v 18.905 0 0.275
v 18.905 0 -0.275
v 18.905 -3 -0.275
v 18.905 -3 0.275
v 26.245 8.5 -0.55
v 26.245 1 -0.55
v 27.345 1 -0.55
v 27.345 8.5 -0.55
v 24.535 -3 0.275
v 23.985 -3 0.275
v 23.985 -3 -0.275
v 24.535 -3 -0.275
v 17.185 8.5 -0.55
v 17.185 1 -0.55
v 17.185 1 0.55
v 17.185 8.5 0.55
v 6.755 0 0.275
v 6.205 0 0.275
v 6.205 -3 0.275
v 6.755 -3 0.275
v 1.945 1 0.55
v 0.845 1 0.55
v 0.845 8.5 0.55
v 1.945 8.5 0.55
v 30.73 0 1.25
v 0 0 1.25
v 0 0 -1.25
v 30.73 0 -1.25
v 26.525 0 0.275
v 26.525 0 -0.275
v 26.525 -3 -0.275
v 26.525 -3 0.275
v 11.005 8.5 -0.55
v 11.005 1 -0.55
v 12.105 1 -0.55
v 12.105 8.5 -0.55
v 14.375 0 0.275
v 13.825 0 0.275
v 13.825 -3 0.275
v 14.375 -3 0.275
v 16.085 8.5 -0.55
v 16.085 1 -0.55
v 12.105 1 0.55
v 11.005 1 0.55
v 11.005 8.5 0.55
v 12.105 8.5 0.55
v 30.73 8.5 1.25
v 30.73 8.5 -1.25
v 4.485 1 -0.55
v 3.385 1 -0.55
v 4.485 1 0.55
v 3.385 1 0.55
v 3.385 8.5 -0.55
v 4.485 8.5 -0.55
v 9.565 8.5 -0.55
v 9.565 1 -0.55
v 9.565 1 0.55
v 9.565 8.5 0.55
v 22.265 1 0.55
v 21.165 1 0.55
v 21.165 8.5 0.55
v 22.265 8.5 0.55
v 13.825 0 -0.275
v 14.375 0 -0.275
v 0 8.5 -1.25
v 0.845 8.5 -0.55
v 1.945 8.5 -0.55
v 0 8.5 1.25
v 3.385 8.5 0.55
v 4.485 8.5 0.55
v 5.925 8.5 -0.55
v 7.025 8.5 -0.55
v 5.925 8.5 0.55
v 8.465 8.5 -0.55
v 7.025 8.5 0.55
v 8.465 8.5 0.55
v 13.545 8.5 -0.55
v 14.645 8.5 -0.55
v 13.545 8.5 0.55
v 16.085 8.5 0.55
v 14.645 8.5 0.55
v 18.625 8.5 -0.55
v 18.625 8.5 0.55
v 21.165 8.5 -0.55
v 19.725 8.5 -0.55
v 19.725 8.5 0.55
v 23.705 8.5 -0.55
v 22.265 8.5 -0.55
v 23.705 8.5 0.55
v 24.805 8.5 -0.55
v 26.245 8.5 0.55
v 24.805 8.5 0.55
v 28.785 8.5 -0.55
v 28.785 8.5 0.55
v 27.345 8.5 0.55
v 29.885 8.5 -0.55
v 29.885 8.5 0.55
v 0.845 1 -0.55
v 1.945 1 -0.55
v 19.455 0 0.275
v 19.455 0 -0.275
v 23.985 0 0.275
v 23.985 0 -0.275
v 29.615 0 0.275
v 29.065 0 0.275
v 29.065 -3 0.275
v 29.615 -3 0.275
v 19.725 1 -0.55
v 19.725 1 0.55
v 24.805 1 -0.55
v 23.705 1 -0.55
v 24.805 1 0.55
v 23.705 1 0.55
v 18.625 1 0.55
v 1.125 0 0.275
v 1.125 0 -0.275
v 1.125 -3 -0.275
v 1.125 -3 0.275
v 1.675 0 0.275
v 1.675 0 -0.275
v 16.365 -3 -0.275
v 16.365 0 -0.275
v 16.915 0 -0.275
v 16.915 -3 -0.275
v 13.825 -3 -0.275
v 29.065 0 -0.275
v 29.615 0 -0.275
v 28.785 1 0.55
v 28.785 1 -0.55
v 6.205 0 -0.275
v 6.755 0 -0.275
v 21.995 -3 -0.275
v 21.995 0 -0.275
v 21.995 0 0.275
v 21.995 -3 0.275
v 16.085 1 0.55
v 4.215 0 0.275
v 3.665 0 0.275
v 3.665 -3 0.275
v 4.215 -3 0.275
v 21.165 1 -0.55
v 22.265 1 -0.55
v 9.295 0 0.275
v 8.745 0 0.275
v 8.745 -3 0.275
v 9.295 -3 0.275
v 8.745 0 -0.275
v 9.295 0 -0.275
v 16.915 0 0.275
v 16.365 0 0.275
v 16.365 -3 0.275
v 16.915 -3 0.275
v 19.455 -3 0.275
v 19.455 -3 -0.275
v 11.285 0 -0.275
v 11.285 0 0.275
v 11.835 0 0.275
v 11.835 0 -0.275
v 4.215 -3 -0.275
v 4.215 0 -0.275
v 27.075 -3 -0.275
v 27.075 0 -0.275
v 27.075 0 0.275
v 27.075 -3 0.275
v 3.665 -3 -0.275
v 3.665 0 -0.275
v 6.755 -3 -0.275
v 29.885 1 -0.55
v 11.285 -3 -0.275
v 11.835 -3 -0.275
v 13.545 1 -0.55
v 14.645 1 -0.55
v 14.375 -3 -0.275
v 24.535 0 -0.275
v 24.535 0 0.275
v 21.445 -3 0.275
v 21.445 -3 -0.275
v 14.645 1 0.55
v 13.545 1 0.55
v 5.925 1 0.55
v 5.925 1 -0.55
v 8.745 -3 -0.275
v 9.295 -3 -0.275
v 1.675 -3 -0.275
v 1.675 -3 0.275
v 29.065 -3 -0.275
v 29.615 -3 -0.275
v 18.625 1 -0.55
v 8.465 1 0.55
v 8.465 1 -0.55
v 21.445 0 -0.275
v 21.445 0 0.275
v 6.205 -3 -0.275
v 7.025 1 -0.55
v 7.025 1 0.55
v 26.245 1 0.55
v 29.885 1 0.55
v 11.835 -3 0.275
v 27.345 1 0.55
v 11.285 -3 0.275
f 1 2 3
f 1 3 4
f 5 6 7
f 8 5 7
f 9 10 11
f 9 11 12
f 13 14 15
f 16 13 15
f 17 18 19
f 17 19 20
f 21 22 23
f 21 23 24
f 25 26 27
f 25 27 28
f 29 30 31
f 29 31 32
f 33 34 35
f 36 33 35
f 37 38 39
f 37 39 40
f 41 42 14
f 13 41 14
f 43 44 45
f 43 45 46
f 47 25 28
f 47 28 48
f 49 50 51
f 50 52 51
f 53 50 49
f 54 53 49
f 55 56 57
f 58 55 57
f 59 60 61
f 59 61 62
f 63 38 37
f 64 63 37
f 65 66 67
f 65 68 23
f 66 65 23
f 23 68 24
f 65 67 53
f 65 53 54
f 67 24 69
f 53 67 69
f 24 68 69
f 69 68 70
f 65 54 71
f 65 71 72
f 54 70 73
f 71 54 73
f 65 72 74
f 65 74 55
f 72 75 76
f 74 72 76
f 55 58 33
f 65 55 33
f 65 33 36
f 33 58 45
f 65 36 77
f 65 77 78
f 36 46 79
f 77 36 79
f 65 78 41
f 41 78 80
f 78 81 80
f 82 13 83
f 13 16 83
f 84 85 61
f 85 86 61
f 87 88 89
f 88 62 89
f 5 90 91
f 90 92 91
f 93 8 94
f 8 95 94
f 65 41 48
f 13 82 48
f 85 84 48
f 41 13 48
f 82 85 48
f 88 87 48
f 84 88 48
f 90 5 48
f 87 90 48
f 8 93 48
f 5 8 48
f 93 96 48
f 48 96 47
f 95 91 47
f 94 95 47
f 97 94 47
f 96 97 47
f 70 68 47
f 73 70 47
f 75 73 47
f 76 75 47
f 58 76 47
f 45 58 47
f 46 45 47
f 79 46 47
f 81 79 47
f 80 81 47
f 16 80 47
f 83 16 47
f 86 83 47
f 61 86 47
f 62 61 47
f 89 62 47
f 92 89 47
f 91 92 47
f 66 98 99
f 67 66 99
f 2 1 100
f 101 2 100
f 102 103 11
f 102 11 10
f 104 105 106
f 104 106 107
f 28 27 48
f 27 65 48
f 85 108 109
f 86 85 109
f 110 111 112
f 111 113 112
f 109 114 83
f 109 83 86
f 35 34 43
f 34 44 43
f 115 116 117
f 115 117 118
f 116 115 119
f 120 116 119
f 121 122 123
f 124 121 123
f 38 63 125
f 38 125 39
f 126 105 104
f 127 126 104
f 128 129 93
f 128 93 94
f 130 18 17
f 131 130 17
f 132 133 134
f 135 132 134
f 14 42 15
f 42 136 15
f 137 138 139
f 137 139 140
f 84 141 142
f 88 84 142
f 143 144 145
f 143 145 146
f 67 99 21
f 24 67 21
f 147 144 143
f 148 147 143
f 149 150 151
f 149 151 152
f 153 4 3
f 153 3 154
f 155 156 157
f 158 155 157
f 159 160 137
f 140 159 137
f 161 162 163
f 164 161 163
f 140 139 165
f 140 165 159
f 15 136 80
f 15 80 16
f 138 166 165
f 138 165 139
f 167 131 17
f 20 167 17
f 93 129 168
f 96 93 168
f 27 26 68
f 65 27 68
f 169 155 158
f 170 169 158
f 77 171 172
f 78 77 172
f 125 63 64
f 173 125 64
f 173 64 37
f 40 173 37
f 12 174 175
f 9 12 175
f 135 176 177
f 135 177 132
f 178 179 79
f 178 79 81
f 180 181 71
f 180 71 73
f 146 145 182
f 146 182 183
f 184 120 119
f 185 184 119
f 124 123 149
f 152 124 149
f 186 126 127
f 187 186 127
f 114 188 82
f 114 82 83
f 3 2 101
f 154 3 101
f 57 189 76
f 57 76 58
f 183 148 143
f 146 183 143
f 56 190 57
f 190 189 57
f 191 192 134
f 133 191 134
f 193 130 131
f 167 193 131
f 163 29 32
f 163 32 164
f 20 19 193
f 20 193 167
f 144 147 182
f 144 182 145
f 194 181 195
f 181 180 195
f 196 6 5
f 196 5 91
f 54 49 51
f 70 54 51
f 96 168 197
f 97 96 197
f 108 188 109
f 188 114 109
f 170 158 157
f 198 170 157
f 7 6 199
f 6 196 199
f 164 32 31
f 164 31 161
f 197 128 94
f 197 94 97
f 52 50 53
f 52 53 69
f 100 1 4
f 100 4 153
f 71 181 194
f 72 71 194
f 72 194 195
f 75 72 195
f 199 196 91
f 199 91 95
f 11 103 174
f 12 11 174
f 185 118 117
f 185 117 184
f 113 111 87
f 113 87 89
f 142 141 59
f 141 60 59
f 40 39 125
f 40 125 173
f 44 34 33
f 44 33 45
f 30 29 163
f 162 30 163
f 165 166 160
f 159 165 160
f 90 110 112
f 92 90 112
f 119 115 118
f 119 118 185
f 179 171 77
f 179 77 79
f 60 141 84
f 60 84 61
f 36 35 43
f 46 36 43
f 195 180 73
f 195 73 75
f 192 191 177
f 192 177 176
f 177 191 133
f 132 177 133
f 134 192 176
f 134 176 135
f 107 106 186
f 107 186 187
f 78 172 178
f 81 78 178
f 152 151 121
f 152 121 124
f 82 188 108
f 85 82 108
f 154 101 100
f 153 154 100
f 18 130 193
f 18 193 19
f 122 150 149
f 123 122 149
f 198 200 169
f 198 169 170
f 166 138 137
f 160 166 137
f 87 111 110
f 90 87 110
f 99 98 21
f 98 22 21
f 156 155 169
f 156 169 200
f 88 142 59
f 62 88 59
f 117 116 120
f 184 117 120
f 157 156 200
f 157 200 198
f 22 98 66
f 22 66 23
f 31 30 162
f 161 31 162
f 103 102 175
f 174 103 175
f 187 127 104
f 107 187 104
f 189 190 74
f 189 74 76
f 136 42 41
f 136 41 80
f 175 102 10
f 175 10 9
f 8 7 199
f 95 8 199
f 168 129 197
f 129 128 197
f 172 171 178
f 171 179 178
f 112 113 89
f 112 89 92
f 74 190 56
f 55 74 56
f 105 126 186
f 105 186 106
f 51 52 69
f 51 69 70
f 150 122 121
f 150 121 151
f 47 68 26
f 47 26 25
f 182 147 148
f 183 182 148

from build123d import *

# Parameters (mm, degrees)
SKETCH1_W              = 30.73
SKETCH1_H              = 8.5
BOSS_EXTRUDE1_DEPTH    = 1.25
SKETCH2_W              = 1.1
SKETCH2_H              = 1.1
CUT_EXTRUDE1_DEPTH     = 9.5
SKETCH3_W              = 30.73
SKETCH3_H              = 2.5
BOSS_EXTRUDE2_DEPTH    = 1
SKETCH4_W              = 0.55
SKETCH4_H              = 0.55
BOSS_EXTRUDE3_DEPTH    = 3
BOSS_EXTRUDE3_2_DEPTH  = 3
BOSS_EXTRUDE3_3_DEPTH  = 3
BOSS_EXTRUDE3_4_DEPTH  = 3
BOSS_EXTRUDE3_5_DEPTH  = 3
BOSS_EXTRUDE3_6_DEPTH  = 3
BOSS_EXTRUDE3_7_DEPTH  = 3
BOSS_EXTRUDE3_8_DEPTH  = 3
BOSS_EXTRUDE3_9_DEPTH  = 3
BOSS_EXTRUDE3_10_DEPTH = 3
BOSS_EXTRUDE3_11_DEPTH = 3
BOSS_EXTRUDE3_12_DEPTH = 3


with BuildPart() as part:
    # Sketch1 → Boss-Extrude1 (new body, symmetric)
    with BuildSketch(Plane.XY):
        with Locations((15.365, 4.25)):
            Rectangle(SKETCH1_W, SKETCH1_H)
    extrude(amount=BOSS_EXTRUDE1_DEPTH, both=True)

    # Sketch2 → Cut-Extrude1 (cut, through all)
    with BuildSketch(Plane.XZ):
        with Locations((3.935, 0)):
            Rectangle(SKETCH2_W, SKETCH2_H)
        with Locations((1.395, 0)):
            Rectangle(SKETCH2_W, SKETCH2_H)
        with Locations((6.475, 0)):
            Rectangle(SKETCH2_W, SKETCH2_H)
        with Locations((9.015, 0)):
            Rectangle(SKETCH2_W, SKETCH2_H)
        with Locations((11.555, 0)):
            Rectangle(SKETCH2_W, SKETCH2_H)
        with Locations((14.095, 0)):
            Rectangle(SKETCH2_W, SKETCH2_H)
        with Locations((16.635, 0)):
            Rectangle(SKETCH2_W, SKETCH2_H)
        with Locations((19.175, 0)):
            Rectangle(SKETCH2_W, SKETCH2_H)
        with Locations((21.715, 0)):
            Rectangle(SKETCH2_W, SKETCH2_H)
        with Locations((24.255, 0)):
            Rectangle(SKETCH2_W, SKETCH2_H)
        with Locations((26.795, 0)):
            Rectangle(SKETCH2_W, SKETCH2_H)
        with Locations((29.335, 0)):
            Rectangle(SKETCH2_W, SKETCH2_H)
    extrude(amount=-CUT_EXTRUDE1_DEPTH, mode=Mode.SUBTRACT)

    # Sketch3 → Boss-Extrude2 (add)
    with BuildSketch(Plane.XZ):
        with Locations((15.365, 0)):
            Rectangle(SKETCH3_W, SKETCH3_H)
    extrude(amount=-BOSS_EXTRUDE2_DEPTH)


with BuildPart() as body_2:
    # Sketch4 → Boss-Extrude3 (new body)
    with BuildSketch(Plane.XZ):
        with Locations((1.4, 0)):
            Rectangle(SKETCH4_W, SKETCH4_H)
    extrude(amount=BOSS_EXTRUDE3_DEPTH)


with BuildPart() as body_3:
    # Sketch4 → Boss-Extrude3 2 (new body)
    with BuildSketch(Plane.XZ):
        with Locations((3.94, 0)):
            Rectangle(SKETCH4_W, SKETCH4_H)
    extrude(amount=BOSS_EXTRUDE3_2_DEPTH)


with BuildPart() as body_4:
    # Sketch4 → Boss-Extrude3 3 (new body)
    with BuildSketch(Plane.XZ):
        with Locations((6.48, 0)):
            Rectangle(SKETCH4_W, SKETCH4_H)
    extrude(amount=BOSS_EXTRUDE3_3_DEPTH)


with BuildPart() as body_5:
    # Sketch4 → Boss-Extrude3 4 (new body)
    with BuildSketch(Plane.XZ):
        with Locations((9.02, 0)):
            Rectangle(SKETCH4_W, SKETCH4_H)
    extrude(amount=BOSS_EXTRUDE3_4_DEPTH)


with BuildPart() as body_6:
    # Sketch4 → Boss-Extrude3 5 (new body)
    with BuildSketch(Plane.XZ):
        with Locations((11.56, 0)):
            Rectangle(SKETCH4_W, SKETCH4_H)
    extrude(amount=BOSS_EXTRUDE3_5_DEPTH)


with BuildPart() as body_7:
    # Sketch4 → Boss-Extrude3 6 (new body)
    with BuildSketch(Plane.XZ):
        with Locations((14.1, 0)):
            Rectangle(SKETCH4_W, SKETCH4_H)
    extrude(amount=BOSS_EXTRUDE3_6_DEPTH)


with BuildPart() as body_8:
    # Sketch4 → Boss-Extrude3 7 (new body)
    with BuildSketch(Plane.XZ):
        with Locations((16.64, 0)):
            Rectangle(SKETCH4_W, SKETCH4_H)
    extrude(amount=BOSS_EXTRUDE3_7_DEPTH)


with BuildPart() as body_9:
    # Sketch4 → Boss-Extrude3 8 (new body)
    with BuildSketch(Plane.XZ):
        with Locations((19.18, 0)):
            Rectangle(SKETCH4_W, SKETCH4_H)
    extrude(amount=BOSS_EXTRUDE3_8_DEPTH)


with BuildPart() as body_10:
    # Sketch4 → Boss-Extrude3 9 (new body)
    with BuildSketch(Plane.XZ):
        with Locations((21.72, 0)):
            Rectangle(SKETCH4_W, SKETCH4_H)
    extrude(amount=BOSS_EXTRUDE3_9_DEPTH)


with BuildPart() as body_11:
    # Sketch4 → Boss-Extrude3 10 (new body)
    with BuildSketch(Plane.XZ):
        with Locations((24.26, 0)):
            Rectangle(SKETCH4_W, SKETCH4_H)
    extrude(amount=BOSS_EXTRUDE3_10_DEPTH)


with BuildPart() as body_12:
    # Sketch4 → Boss-Extrude3 11 (new body)
    with BuildSketch(Plane.XZ):
        with Locations((26.8, 0)):
            Rectangle(SKETCH4_W, SKETCH4_H)
    extrude(amount=BOSS_EXTRUDE3_11_DEPTH)


with BuildPart() as body_13:
    # Sketch4 → Boss-Extrude3 12 (new body)
    with BuildSketch(Plane.XZ):
        with Locations((29.34, 0)):
            Rectangle(SKETCH4_W, SKETCH4_H)
    extrude(amount=BOSS_EXTRUDE3_12_DEPTH)


solid = Compound([part.part, body_2.part, body_3.part, body_4.part, body_5.part, body_6.part, body_7.part, body_8.part, body_9.part, body_10.part, body_11.part, body_12.part, body_13.part])
